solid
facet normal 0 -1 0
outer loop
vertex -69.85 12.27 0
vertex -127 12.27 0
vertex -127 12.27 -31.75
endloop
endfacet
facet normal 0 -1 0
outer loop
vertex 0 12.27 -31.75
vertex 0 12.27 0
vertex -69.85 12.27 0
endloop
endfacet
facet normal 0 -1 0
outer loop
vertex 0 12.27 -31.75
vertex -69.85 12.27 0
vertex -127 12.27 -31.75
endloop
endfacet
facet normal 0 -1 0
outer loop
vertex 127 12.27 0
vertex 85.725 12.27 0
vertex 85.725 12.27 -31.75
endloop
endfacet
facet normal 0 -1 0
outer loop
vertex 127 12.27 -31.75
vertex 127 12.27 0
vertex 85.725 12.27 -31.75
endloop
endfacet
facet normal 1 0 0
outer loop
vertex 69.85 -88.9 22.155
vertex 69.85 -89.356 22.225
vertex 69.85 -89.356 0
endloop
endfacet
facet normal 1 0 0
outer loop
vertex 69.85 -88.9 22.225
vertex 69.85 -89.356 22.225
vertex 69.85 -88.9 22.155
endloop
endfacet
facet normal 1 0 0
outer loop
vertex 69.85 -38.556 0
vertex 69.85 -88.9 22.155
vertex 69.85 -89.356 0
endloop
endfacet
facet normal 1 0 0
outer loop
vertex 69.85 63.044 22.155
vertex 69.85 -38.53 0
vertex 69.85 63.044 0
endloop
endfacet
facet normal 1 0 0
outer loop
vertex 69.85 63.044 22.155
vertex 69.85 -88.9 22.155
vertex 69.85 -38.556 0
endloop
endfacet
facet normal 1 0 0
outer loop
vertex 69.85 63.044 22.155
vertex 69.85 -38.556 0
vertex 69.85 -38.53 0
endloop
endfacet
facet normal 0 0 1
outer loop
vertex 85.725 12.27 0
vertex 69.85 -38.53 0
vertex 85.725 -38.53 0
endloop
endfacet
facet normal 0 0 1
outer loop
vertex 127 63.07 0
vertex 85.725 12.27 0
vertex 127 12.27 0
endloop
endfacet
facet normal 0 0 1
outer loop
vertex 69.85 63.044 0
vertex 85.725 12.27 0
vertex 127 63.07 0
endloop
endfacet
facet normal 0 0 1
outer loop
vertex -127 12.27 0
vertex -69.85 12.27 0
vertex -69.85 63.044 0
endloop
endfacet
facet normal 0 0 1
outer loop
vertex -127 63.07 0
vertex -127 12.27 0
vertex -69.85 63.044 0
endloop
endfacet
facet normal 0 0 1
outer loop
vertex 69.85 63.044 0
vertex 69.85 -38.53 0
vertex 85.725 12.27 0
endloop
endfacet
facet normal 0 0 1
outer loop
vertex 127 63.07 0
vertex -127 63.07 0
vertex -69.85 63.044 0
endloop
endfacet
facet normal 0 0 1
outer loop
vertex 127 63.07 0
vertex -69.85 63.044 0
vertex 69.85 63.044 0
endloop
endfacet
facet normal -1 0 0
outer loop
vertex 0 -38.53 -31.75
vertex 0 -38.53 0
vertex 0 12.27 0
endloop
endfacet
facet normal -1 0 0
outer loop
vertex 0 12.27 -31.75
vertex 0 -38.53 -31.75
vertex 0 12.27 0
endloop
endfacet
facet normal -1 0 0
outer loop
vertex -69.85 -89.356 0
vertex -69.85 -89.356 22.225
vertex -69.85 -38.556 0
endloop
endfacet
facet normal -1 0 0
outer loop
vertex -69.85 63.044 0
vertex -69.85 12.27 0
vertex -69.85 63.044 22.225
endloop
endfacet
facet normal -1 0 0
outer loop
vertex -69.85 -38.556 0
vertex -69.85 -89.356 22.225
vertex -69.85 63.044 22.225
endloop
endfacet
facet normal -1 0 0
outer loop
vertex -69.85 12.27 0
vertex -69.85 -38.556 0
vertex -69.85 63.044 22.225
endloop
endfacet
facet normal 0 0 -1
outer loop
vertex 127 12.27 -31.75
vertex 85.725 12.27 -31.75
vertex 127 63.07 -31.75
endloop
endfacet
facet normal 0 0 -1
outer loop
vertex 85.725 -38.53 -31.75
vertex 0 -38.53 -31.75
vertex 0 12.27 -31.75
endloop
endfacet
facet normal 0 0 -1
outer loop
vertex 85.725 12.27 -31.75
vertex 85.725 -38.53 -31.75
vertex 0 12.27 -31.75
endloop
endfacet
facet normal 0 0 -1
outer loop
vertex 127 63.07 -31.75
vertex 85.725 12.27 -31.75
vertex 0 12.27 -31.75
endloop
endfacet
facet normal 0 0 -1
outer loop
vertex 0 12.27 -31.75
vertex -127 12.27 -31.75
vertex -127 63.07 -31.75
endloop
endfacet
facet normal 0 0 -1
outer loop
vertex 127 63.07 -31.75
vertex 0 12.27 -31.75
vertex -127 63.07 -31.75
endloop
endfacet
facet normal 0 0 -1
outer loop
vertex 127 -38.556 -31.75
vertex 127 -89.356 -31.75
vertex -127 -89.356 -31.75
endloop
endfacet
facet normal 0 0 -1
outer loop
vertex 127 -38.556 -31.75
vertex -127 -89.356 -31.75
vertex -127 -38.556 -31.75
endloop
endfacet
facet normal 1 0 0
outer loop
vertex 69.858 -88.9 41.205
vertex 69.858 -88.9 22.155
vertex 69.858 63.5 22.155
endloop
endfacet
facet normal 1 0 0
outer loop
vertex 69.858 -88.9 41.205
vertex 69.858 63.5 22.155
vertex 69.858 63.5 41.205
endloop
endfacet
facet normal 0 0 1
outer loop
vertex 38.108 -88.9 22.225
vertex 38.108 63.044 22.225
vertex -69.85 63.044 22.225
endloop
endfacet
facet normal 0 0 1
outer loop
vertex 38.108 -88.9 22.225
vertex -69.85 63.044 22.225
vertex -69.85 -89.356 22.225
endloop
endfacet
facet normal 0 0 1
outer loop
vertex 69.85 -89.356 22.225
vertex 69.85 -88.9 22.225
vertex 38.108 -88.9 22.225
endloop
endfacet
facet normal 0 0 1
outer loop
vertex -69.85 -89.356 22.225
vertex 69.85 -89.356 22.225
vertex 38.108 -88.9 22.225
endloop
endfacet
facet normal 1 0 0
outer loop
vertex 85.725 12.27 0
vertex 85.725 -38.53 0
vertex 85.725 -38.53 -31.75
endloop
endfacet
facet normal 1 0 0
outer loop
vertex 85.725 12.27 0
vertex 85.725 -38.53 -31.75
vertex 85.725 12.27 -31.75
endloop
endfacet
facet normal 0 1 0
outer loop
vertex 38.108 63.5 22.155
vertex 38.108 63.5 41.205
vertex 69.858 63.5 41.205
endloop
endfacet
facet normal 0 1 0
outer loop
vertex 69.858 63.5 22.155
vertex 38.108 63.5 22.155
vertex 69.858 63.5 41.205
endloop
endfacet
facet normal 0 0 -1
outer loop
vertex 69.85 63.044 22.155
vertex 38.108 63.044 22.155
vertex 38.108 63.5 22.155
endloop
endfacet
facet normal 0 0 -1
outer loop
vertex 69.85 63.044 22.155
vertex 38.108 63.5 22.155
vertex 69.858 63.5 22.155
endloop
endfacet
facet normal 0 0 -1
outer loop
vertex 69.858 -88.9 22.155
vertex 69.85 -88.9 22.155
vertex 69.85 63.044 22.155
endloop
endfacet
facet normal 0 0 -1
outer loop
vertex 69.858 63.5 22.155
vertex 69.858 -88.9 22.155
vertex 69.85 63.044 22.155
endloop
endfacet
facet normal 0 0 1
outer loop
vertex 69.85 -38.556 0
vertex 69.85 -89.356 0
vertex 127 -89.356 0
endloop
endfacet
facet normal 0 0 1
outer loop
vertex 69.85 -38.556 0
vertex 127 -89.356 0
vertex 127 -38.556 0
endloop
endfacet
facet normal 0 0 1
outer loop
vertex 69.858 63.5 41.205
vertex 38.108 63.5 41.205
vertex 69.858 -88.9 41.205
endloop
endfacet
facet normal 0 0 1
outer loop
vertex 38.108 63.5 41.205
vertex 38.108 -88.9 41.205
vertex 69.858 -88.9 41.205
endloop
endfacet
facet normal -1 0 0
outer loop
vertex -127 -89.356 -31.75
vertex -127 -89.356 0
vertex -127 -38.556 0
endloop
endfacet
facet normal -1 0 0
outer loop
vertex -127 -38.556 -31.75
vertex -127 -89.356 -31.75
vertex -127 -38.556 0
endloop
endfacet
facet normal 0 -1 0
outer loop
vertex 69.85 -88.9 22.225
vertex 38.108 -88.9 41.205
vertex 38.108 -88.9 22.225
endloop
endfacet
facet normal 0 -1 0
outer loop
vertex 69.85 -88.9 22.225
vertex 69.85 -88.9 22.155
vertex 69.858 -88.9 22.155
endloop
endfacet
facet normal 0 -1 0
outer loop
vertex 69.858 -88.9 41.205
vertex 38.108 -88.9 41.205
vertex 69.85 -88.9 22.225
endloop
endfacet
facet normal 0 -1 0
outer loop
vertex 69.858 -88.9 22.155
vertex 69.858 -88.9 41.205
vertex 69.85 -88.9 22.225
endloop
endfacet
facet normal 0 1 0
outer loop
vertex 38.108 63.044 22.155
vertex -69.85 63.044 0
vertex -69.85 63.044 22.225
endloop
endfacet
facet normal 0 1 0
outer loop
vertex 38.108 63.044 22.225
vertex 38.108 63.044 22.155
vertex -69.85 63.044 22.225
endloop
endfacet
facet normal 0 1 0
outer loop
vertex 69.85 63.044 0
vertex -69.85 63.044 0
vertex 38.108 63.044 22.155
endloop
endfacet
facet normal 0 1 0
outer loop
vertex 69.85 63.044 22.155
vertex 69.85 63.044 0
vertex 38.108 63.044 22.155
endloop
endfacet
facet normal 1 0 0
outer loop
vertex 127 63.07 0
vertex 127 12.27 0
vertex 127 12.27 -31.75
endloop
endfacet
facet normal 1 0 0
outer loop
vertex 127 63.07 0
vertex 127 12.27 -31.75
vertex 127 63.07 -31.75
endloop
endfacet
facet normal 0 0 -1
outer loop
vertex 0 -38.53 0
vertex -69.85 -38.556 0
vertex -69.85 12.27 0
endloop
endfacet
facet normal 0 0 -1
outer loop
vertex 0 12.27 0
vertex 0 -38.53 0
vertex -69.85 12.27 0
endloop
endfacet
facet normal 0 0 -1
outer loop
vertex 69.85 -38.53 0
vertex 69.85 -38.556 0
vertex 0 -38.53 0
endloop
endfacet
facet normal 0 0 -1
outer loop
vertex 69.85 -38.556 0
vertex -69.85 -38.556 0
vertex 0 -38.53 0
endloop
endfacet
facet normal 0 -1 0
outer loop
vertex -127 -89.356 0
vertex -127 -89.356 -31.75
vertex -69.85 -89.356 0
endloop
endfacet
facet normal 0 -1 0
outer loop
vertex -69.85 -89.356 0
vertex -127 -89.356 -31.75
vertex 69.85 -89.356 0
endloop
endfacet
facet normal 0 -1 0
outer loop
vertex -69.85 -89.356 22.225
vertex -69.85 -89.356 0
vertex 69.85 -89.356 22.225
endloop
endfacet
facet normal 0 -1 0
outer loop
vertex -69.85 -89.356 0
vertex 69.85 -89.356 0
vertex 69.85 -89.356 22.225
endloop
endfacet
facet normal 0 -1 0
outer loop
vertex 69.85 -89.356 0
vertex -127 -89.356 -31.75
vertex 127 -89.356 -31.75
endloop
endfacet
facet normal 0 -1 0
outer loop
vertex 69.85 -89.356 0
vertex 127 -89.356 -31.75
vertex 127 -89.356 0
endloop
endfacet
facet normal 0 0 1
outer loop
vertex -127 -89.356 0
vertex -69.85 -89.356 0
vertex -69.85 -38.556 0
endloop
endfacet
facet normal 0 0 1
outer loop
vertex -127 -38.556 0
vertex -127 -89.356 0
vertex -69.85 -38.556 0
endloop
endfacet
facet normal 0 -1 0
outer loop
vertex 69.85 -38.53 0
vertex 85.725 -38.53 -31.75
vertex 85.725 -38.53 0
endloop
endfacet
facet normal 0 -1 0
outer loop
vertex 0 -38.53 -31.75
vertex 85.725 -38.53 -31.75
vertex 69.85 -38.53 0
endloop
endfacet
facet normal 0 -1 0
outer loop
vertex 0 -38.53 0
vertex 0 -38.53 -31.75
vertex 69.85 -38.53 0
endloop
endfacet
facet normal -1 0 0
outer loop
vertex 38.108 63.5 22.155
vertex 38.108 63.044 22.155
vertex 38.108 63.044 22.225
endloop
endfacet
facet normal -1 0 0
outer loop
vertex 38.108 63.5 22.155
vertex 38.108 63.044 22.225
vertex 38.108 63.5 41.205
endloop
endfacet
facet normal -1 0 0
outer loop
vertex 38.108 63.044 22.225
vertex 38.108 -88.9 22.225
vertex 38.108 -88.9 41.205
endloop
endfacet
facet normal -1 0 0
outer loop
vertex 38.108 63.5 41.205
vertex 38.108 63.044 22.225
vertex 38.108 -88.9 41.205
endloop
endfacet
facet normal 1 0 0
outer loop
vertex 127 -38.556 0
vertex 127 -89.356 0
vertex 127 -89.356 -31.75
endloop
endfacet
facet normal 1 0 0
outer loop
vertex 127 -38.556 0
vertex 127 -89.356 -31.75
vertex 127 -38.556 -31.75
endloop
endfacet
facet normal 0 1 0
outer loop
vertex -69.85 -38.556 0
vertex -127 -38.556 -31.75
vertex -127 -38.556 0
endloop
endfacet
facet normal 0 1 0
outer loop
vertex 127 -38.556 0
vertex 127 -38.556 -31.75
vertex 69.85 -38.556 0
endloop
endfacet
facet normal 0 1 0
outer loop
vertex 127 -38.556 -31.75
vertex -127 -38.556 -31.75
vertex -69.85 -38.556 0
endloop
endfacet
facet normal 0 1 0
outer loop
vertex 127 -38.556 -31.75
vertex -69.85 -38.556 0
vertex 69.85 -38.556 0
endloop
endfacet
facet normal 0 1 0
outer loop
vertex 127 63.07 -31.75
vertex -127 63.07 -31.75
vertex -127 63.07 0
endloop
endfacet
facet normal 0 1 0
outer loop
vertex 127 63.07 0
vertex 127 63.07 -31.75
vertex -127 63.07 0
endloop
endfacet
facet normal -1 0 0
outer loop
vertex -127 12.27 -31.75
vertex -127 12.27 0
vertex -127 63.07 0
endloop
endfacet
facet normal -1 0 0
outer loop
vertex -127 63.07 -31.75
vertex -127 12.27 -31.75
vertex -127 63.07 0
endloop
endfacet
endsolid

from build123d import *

# Parameters (mm, degrees)
F1_DEPTH      = 69.85
F1_DEPTH_BACK = 69.85
F0_W          = 50.8
F0_H          = 31.75
F2_DEPTH      = 85.725
F3_DEPTH      = 127
F3_DEPTH_BACK = 127
F4_W          = 31.75
F4_H          = 19.05
F5_DEPTH      = 88.9
F5_DEPTH_BACK = 63.5


with BuildPart() as f1:
    # F0 (on Right) → F1 (new body, two sides)
    with BuildSketch(Plane.YZ) as f1_sk:
        Polygon((-89.356257, 22.225), (-89.356257, 0), (-38.556257, 0), (-38.529839, 0), (12.270161, 0), (63.043743, 0), (63.043743, 22.225), (31.293743, 22.225), (-57.606257, 22.225), align=None)
    extrude(amount=F1_DEPTH)
    extrude(f1_sk.sketch, amount=-F1_DEPTH_BACK)

    # F0 (on Right) → F2 (join)
    with BuildSketch(Plane.YZ):
        with Locations((-13.129839, -15.875)):
            Rectangle(F0_W, F0_H)
    extrude(amount=F2_DEPTH)

    # F0 (on Right) → F3 (join, two sides)
    with BuildSketch(Plane.YZ) as f3_sk:
        with Locations((-63.956257, -15.875)):
            Rectangle(F0_W, F0_H)
        Polygon((63.043743, 0), (12.270161, 0), (12.270161, -31.75), (63.070161, -31.75), (63.070161, 0), align=None)
    extrude(amount=F3_DEPTH)
    extrude(f3_sk.sketch, amount=-F3_DEPTH_BACK)

    # F4 (on Front) → F5 (join, two sides)
    with BuildSketch(Plane.XZ) as f5_sk:
        with Locations((53.98327, 31.68009)):
            Rectangle(F4_W, F4_H)
    extrude(amount=F5_DEPTH)
    extrude(f5_sk.sketch, amount=-F5_DEPTH_BACK)


solid = f1.part
